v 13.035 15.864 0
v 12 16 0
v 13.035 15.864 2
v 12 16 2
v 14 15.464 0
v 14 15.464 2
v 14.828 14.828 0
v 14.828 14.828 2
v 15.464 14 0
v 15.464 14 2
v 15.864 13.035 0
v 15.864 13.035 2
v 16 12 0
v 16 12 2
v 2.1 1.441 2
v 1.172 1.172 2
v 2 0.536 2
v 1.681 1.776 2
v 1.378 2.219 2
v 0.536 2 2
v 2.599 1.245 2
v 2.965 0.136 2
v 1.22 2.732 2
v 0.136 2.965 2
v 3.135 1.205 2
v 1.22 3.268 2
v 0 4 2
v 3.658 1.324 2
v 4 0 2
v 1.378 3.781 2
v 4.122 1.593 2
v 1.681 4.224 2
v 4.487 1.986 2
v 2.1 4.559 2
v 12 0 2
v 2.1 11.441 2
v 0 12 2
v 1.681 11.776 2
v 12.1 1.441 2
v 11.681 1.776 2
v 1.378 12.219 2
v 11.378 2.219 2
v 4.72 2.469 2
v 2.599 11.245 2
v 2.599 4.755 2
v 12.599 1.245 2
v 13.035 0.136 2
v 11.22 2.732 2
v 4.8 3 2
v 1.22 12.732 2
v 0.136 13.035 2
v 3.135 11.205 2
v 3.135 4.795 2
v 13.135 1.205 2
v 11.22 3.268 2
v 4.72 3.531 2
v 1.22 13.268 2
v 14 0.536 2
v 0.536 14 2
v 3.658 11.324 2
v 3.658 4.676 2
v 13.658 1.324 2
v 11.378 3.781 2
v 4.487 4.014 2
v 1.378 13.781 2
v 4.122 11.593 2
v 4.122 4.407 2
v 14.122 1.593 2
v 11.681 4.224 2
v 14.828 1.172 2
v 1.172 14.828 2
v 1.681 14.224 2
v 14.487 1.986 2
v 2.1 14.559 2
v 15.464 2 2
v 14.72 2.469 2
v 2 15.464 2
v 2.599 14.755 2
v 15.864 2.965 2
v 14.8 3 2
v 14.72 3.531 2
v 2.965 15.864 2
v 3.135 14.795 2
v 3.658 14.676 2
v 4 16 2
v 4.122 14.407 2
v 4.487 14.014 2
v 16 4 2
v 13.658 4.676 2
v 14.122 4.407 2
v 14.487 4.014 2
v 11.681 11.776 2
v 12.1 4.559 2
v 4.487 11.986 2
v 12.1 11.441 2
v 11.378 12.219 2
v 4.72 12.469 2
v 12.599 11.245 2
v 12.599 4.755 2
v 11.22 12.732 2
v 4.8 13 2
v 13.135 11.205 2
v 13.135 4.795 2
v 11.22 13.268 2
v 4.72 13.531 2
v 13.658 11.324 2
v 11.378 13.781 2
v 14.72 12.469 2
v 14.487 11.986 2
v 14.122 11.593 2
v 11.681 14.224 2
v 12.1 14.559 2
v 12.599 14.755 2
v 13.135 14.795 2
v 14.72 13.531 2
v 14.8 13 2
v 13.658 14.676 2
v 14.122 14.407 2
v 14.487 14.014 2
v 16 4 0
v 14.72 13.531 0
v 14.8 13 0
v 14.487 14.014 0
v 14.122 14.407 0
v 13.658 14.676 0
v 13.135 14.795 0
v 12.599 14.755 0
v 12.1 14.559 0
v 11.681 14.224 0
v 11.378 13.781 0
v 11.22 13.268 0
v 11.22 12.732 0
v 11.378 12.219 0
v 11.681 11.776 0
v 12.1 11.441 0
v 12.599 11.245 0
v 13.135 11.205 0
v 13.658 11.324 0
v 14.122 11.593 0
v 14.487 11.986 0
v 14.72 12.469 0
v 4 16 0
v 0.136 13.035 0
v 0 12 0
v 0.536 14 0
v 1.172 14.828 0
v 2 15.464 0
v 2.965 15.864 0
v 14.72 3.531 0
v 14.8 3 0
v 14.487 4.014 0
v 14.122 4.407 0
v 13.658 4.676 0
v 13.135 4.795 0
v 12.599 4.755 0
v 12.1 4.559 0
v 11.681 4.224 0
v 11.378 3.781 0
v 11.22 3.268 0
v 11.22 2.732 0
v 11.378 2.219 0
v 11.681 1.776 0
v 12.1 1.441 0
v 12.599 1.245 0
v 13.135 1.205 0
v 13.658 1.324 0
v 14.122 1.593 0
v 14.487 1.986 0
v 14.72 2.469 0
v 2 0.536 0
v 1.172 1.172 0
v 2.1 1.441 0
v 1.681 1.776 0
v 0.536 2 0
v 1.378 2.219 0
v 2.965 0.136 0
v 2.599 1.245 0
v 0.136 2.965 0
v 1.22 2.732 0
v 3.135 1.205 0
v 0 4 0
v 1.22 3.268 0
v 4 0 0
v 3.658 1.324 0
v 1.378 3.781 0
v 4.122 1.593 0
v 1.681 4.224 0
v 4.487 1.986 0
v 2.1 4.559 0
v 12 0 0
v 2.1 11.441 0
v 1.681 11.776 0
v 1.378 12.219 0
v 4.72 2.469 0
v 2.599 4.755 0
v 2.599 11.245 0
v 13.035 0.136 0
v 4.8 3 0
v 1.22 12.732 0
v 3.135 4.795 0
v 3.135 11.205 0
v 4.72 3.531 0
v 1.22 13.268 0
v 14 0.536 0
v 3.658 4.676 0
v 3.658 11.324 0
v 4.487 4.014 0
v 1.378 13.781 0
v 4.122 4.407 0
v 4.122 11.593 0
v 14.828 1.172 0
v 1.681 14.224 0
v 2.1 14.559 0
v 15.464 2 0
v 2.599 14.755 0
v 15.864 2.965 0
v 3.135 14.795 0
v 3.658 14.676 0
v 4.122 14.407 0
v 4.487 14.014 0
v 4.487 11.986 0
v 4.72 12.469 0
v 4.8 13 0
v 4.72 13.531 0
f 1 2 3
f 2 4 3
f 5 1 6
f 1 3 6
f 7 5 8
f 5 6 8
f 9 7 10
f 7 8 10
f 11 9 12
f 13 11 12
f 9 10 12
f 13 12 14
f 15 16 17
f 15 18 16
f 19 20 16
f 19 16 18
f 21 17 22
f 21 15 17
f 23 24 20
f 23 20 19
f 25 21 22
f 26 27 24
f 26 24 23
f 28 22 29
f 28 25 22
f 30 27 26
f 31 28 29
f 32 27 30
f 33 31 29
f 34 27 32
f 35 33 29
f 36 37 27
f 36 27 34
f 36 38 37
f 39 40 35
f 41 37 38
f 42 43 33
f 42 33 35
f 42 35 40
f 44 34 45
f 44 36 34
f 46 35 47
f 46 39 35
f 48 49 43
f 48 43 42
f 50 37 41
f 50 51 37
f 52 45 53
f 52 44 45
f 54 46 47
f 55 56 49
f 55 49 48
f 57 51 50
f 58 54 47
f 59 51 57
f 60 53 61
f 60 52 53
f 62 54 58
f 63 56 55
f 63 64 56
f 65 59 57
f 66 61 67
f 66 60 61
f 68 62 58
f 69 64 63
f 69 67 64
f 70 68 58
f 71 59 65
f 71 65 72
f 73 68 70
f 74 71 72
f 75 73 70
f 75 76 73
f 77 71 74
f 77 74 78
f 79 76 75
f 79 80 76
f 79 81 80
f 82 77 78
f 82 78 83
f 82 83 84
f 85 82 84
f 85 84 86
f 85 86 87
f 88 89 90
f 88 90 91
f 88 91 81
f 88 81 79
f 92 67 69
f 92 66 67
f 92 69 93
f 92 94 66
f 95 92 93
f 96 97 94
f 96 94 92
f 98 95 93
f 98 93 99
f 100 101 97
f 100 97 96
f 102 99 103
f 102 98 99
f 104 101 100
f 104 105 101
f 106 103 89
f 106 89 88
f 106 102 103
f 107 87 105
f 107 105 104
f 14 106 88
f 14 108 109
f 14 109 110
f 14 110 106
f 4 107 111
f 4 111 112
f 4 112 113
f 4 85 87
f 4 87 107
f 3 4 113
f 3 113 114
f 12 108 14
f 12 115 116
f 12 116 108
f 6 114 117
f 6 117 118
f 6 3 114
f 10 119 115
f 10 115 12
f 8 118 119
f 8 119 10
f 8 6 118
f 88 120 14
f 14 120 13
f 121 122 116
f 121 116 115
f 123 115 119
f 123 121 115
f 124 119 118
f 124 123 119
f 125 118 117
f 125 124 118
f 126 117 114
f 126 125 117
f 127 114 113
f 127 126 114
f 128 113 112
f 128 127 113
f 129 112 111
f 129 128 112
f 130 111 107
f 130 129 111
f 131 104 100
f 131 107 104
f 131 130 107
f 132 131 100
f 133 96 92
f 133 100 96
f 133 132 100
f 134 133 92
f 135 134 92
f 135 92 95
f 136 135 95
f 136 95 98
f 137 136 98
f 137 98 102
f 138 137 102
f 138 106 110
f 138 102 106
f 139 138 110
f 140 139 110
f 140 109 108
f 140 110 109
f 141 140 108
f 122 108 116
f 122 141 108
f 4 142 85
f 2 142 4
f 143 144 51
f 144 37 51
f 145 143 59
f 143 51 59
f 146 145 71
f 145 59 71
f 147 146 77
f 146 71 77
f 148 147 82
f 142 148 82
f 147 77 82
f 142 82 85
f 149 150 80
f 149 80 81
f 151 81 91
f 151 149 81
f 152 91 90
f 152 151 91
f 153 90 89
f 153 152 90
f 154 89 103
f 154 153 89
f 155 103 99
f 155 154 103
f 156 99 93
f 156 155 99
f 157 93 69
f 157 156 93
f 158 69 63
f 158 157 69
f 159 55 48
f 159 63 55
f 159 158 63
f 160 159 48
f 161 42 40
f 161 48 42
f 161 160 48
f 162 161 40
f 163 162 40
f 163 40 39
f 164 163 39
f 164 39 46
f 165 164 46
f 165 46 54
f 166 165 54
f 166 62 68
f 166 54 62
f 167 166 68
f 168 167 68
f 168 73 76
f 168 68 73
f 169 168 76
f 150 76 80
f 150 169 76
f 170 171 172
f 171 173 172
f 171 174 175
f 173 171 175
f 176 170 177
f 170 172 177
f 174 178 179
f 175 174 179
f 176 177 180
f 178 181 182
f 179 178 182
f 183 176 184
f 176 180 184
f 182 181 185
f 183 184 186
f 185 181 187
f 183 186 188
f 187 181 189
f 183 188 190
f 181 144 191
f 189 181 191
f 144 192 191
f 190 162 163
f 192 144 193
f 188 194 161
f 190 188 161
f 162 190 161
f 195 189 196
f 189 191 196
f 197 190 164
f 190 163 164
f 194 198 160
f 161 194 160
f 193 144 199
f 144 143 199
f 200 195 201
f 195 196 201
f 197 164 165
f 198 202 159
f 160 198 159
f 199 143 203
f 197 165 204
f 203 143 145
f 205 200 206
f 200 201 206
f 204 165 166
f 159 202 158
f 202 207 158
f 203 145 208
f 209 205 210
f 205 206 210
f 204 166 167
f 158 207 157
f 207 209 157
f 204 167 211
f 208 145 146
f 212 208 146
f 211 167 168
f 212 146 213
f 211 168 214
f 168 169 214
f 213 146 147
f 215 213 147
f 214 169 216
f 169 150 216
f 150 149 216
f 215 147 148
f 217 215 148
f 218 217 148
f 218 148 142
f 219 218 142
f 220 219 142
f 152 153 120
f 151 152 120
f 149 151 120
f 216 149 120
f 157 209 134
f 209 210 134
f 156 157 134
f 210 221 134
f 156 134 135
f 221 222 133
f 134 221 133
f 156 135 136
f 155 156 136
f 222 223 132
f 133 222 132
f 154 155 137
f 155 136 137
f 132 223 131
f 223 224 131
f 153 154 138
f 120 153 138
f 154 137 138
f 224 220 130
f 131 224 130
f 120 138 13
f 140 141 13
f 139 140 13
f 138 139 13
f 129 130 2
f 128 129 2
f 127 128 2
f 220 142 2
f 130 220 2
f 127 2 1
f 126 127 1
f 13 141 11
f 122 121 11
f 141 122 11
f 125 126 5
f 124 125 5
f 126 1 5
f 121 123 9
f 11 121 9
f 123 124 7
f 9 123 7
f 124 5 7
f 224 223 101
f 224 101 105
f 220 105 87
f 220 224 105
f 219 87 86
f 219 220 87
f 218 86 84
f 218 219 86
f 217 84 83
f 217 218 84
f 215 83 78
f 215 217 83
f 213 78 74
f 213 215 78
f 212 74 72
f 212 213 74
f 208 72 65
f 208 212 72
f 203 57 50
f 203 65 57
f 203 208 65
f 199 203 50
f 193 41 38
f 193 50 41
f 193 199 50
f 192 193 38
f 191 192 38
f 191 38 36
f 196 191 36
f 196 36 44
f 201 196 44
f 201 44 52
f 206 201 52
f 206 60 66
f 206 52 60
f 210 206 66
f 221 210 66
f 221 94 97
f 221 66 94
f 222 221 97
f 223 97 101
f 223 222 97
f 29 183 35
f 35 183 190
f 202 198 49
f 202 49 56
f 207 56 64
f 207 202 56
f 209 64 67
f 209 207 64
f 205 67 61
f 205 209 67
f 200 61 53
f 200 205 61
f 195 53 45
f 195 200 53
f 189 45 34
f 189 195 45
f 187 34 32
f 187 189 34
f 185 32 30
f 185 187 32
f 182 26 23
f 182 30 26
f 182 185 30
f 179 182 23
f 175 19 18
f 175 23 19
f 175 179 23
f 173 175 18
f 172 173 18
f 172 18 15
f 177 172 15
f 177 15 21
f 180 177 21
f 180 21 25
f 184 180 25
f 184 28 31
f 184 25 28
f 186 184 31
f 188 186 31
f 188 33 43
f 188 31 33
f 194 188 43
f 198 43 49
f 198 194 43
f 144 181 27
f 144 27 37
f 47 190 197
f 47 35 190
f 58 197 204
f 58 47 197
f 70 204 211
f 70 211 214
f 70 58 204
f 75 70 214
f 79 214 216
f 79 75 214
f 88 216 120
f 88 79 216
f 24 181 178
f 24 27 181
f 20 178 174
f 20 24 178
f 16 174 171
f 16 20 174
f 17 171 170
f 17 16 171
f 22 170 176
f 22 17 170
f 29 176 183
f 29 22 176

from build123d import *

# Parameters (mm, degrees)
CYLINDER059_R       = 1.8
CYLINDER059_DEPTH   = 20
ARRAY001007_X_COUNT = 2
ARRAY001007_X_PITCH = 10
ARRAY001007_Y_COUNT = 2
ARRAY001007_Y_PITCH = 10
BOX008_W            = 16
BOX008_H            = 16
BOX008_DEPTH        = 2
FILLET014_R         = 4


with BuildPart() as rod_holder_hole_array001:
    # Cylinder059 → Cylinder059 (new body)
    with BuildSketch(Plane(origin=(3, 3, -6), x_dir=(1, 0, 0), z_dir=(0, 0, 1))):
        Circle(CYLINDER059_R)
    extrude(amount=CYLINDER059_DEPTH)

    # Array001007 X: rod holder hole array001 ×2


with BuildPart() as rod_holder_hole_array001_1:
    add(rod_holder_hole_array001.part)
    with Locations(*[(i * ARRAY001007_X_PITCH, 0, 0) for i in range(1, ARRAY001007_X_COUNT)]):
        add(rod_holder_hole_array001.part)

    # Array001007 Y: rod holder hole array001 ×2


with BuildPart() as rod_holder_hole_array001_2:
    add(rod_holder_hole_array001_1.part)
    with Locations(*[(0, i * ARRAY001007_Y_PITCH, 0) for i in range(1, ARRAY001007_Y_COUNT)]):
        add(rod_holder_hole_array001_1.part)


with BuildPart() as rod_cover_fillet:
    # Box008 → Box008 (new body)
    with BuildSketch(Plane.XY):
        with Locations((8, 8)):
            Rectangle(BOX008_W, BOX008_H)
    extrude(amount=BOX008_DEPTH)

    # Cut023005: cut rod holder hole array001
    add(rod_holder_hole_array001_2.part, mode=Mode.SUBTRACT)

    # Fillet014
    fillet014_edges = [rod_cover_fillet.edges().sort_by_distance(p)[0] for p in [
        (0, 0, 1),
        (0, 16, 1),
        (16, 0, 1),
        (16, 16, 1),
    ]]
    fillet(fillet014_edges, radius=FILLET014_R)


solid = rod_cover_fillet.part
